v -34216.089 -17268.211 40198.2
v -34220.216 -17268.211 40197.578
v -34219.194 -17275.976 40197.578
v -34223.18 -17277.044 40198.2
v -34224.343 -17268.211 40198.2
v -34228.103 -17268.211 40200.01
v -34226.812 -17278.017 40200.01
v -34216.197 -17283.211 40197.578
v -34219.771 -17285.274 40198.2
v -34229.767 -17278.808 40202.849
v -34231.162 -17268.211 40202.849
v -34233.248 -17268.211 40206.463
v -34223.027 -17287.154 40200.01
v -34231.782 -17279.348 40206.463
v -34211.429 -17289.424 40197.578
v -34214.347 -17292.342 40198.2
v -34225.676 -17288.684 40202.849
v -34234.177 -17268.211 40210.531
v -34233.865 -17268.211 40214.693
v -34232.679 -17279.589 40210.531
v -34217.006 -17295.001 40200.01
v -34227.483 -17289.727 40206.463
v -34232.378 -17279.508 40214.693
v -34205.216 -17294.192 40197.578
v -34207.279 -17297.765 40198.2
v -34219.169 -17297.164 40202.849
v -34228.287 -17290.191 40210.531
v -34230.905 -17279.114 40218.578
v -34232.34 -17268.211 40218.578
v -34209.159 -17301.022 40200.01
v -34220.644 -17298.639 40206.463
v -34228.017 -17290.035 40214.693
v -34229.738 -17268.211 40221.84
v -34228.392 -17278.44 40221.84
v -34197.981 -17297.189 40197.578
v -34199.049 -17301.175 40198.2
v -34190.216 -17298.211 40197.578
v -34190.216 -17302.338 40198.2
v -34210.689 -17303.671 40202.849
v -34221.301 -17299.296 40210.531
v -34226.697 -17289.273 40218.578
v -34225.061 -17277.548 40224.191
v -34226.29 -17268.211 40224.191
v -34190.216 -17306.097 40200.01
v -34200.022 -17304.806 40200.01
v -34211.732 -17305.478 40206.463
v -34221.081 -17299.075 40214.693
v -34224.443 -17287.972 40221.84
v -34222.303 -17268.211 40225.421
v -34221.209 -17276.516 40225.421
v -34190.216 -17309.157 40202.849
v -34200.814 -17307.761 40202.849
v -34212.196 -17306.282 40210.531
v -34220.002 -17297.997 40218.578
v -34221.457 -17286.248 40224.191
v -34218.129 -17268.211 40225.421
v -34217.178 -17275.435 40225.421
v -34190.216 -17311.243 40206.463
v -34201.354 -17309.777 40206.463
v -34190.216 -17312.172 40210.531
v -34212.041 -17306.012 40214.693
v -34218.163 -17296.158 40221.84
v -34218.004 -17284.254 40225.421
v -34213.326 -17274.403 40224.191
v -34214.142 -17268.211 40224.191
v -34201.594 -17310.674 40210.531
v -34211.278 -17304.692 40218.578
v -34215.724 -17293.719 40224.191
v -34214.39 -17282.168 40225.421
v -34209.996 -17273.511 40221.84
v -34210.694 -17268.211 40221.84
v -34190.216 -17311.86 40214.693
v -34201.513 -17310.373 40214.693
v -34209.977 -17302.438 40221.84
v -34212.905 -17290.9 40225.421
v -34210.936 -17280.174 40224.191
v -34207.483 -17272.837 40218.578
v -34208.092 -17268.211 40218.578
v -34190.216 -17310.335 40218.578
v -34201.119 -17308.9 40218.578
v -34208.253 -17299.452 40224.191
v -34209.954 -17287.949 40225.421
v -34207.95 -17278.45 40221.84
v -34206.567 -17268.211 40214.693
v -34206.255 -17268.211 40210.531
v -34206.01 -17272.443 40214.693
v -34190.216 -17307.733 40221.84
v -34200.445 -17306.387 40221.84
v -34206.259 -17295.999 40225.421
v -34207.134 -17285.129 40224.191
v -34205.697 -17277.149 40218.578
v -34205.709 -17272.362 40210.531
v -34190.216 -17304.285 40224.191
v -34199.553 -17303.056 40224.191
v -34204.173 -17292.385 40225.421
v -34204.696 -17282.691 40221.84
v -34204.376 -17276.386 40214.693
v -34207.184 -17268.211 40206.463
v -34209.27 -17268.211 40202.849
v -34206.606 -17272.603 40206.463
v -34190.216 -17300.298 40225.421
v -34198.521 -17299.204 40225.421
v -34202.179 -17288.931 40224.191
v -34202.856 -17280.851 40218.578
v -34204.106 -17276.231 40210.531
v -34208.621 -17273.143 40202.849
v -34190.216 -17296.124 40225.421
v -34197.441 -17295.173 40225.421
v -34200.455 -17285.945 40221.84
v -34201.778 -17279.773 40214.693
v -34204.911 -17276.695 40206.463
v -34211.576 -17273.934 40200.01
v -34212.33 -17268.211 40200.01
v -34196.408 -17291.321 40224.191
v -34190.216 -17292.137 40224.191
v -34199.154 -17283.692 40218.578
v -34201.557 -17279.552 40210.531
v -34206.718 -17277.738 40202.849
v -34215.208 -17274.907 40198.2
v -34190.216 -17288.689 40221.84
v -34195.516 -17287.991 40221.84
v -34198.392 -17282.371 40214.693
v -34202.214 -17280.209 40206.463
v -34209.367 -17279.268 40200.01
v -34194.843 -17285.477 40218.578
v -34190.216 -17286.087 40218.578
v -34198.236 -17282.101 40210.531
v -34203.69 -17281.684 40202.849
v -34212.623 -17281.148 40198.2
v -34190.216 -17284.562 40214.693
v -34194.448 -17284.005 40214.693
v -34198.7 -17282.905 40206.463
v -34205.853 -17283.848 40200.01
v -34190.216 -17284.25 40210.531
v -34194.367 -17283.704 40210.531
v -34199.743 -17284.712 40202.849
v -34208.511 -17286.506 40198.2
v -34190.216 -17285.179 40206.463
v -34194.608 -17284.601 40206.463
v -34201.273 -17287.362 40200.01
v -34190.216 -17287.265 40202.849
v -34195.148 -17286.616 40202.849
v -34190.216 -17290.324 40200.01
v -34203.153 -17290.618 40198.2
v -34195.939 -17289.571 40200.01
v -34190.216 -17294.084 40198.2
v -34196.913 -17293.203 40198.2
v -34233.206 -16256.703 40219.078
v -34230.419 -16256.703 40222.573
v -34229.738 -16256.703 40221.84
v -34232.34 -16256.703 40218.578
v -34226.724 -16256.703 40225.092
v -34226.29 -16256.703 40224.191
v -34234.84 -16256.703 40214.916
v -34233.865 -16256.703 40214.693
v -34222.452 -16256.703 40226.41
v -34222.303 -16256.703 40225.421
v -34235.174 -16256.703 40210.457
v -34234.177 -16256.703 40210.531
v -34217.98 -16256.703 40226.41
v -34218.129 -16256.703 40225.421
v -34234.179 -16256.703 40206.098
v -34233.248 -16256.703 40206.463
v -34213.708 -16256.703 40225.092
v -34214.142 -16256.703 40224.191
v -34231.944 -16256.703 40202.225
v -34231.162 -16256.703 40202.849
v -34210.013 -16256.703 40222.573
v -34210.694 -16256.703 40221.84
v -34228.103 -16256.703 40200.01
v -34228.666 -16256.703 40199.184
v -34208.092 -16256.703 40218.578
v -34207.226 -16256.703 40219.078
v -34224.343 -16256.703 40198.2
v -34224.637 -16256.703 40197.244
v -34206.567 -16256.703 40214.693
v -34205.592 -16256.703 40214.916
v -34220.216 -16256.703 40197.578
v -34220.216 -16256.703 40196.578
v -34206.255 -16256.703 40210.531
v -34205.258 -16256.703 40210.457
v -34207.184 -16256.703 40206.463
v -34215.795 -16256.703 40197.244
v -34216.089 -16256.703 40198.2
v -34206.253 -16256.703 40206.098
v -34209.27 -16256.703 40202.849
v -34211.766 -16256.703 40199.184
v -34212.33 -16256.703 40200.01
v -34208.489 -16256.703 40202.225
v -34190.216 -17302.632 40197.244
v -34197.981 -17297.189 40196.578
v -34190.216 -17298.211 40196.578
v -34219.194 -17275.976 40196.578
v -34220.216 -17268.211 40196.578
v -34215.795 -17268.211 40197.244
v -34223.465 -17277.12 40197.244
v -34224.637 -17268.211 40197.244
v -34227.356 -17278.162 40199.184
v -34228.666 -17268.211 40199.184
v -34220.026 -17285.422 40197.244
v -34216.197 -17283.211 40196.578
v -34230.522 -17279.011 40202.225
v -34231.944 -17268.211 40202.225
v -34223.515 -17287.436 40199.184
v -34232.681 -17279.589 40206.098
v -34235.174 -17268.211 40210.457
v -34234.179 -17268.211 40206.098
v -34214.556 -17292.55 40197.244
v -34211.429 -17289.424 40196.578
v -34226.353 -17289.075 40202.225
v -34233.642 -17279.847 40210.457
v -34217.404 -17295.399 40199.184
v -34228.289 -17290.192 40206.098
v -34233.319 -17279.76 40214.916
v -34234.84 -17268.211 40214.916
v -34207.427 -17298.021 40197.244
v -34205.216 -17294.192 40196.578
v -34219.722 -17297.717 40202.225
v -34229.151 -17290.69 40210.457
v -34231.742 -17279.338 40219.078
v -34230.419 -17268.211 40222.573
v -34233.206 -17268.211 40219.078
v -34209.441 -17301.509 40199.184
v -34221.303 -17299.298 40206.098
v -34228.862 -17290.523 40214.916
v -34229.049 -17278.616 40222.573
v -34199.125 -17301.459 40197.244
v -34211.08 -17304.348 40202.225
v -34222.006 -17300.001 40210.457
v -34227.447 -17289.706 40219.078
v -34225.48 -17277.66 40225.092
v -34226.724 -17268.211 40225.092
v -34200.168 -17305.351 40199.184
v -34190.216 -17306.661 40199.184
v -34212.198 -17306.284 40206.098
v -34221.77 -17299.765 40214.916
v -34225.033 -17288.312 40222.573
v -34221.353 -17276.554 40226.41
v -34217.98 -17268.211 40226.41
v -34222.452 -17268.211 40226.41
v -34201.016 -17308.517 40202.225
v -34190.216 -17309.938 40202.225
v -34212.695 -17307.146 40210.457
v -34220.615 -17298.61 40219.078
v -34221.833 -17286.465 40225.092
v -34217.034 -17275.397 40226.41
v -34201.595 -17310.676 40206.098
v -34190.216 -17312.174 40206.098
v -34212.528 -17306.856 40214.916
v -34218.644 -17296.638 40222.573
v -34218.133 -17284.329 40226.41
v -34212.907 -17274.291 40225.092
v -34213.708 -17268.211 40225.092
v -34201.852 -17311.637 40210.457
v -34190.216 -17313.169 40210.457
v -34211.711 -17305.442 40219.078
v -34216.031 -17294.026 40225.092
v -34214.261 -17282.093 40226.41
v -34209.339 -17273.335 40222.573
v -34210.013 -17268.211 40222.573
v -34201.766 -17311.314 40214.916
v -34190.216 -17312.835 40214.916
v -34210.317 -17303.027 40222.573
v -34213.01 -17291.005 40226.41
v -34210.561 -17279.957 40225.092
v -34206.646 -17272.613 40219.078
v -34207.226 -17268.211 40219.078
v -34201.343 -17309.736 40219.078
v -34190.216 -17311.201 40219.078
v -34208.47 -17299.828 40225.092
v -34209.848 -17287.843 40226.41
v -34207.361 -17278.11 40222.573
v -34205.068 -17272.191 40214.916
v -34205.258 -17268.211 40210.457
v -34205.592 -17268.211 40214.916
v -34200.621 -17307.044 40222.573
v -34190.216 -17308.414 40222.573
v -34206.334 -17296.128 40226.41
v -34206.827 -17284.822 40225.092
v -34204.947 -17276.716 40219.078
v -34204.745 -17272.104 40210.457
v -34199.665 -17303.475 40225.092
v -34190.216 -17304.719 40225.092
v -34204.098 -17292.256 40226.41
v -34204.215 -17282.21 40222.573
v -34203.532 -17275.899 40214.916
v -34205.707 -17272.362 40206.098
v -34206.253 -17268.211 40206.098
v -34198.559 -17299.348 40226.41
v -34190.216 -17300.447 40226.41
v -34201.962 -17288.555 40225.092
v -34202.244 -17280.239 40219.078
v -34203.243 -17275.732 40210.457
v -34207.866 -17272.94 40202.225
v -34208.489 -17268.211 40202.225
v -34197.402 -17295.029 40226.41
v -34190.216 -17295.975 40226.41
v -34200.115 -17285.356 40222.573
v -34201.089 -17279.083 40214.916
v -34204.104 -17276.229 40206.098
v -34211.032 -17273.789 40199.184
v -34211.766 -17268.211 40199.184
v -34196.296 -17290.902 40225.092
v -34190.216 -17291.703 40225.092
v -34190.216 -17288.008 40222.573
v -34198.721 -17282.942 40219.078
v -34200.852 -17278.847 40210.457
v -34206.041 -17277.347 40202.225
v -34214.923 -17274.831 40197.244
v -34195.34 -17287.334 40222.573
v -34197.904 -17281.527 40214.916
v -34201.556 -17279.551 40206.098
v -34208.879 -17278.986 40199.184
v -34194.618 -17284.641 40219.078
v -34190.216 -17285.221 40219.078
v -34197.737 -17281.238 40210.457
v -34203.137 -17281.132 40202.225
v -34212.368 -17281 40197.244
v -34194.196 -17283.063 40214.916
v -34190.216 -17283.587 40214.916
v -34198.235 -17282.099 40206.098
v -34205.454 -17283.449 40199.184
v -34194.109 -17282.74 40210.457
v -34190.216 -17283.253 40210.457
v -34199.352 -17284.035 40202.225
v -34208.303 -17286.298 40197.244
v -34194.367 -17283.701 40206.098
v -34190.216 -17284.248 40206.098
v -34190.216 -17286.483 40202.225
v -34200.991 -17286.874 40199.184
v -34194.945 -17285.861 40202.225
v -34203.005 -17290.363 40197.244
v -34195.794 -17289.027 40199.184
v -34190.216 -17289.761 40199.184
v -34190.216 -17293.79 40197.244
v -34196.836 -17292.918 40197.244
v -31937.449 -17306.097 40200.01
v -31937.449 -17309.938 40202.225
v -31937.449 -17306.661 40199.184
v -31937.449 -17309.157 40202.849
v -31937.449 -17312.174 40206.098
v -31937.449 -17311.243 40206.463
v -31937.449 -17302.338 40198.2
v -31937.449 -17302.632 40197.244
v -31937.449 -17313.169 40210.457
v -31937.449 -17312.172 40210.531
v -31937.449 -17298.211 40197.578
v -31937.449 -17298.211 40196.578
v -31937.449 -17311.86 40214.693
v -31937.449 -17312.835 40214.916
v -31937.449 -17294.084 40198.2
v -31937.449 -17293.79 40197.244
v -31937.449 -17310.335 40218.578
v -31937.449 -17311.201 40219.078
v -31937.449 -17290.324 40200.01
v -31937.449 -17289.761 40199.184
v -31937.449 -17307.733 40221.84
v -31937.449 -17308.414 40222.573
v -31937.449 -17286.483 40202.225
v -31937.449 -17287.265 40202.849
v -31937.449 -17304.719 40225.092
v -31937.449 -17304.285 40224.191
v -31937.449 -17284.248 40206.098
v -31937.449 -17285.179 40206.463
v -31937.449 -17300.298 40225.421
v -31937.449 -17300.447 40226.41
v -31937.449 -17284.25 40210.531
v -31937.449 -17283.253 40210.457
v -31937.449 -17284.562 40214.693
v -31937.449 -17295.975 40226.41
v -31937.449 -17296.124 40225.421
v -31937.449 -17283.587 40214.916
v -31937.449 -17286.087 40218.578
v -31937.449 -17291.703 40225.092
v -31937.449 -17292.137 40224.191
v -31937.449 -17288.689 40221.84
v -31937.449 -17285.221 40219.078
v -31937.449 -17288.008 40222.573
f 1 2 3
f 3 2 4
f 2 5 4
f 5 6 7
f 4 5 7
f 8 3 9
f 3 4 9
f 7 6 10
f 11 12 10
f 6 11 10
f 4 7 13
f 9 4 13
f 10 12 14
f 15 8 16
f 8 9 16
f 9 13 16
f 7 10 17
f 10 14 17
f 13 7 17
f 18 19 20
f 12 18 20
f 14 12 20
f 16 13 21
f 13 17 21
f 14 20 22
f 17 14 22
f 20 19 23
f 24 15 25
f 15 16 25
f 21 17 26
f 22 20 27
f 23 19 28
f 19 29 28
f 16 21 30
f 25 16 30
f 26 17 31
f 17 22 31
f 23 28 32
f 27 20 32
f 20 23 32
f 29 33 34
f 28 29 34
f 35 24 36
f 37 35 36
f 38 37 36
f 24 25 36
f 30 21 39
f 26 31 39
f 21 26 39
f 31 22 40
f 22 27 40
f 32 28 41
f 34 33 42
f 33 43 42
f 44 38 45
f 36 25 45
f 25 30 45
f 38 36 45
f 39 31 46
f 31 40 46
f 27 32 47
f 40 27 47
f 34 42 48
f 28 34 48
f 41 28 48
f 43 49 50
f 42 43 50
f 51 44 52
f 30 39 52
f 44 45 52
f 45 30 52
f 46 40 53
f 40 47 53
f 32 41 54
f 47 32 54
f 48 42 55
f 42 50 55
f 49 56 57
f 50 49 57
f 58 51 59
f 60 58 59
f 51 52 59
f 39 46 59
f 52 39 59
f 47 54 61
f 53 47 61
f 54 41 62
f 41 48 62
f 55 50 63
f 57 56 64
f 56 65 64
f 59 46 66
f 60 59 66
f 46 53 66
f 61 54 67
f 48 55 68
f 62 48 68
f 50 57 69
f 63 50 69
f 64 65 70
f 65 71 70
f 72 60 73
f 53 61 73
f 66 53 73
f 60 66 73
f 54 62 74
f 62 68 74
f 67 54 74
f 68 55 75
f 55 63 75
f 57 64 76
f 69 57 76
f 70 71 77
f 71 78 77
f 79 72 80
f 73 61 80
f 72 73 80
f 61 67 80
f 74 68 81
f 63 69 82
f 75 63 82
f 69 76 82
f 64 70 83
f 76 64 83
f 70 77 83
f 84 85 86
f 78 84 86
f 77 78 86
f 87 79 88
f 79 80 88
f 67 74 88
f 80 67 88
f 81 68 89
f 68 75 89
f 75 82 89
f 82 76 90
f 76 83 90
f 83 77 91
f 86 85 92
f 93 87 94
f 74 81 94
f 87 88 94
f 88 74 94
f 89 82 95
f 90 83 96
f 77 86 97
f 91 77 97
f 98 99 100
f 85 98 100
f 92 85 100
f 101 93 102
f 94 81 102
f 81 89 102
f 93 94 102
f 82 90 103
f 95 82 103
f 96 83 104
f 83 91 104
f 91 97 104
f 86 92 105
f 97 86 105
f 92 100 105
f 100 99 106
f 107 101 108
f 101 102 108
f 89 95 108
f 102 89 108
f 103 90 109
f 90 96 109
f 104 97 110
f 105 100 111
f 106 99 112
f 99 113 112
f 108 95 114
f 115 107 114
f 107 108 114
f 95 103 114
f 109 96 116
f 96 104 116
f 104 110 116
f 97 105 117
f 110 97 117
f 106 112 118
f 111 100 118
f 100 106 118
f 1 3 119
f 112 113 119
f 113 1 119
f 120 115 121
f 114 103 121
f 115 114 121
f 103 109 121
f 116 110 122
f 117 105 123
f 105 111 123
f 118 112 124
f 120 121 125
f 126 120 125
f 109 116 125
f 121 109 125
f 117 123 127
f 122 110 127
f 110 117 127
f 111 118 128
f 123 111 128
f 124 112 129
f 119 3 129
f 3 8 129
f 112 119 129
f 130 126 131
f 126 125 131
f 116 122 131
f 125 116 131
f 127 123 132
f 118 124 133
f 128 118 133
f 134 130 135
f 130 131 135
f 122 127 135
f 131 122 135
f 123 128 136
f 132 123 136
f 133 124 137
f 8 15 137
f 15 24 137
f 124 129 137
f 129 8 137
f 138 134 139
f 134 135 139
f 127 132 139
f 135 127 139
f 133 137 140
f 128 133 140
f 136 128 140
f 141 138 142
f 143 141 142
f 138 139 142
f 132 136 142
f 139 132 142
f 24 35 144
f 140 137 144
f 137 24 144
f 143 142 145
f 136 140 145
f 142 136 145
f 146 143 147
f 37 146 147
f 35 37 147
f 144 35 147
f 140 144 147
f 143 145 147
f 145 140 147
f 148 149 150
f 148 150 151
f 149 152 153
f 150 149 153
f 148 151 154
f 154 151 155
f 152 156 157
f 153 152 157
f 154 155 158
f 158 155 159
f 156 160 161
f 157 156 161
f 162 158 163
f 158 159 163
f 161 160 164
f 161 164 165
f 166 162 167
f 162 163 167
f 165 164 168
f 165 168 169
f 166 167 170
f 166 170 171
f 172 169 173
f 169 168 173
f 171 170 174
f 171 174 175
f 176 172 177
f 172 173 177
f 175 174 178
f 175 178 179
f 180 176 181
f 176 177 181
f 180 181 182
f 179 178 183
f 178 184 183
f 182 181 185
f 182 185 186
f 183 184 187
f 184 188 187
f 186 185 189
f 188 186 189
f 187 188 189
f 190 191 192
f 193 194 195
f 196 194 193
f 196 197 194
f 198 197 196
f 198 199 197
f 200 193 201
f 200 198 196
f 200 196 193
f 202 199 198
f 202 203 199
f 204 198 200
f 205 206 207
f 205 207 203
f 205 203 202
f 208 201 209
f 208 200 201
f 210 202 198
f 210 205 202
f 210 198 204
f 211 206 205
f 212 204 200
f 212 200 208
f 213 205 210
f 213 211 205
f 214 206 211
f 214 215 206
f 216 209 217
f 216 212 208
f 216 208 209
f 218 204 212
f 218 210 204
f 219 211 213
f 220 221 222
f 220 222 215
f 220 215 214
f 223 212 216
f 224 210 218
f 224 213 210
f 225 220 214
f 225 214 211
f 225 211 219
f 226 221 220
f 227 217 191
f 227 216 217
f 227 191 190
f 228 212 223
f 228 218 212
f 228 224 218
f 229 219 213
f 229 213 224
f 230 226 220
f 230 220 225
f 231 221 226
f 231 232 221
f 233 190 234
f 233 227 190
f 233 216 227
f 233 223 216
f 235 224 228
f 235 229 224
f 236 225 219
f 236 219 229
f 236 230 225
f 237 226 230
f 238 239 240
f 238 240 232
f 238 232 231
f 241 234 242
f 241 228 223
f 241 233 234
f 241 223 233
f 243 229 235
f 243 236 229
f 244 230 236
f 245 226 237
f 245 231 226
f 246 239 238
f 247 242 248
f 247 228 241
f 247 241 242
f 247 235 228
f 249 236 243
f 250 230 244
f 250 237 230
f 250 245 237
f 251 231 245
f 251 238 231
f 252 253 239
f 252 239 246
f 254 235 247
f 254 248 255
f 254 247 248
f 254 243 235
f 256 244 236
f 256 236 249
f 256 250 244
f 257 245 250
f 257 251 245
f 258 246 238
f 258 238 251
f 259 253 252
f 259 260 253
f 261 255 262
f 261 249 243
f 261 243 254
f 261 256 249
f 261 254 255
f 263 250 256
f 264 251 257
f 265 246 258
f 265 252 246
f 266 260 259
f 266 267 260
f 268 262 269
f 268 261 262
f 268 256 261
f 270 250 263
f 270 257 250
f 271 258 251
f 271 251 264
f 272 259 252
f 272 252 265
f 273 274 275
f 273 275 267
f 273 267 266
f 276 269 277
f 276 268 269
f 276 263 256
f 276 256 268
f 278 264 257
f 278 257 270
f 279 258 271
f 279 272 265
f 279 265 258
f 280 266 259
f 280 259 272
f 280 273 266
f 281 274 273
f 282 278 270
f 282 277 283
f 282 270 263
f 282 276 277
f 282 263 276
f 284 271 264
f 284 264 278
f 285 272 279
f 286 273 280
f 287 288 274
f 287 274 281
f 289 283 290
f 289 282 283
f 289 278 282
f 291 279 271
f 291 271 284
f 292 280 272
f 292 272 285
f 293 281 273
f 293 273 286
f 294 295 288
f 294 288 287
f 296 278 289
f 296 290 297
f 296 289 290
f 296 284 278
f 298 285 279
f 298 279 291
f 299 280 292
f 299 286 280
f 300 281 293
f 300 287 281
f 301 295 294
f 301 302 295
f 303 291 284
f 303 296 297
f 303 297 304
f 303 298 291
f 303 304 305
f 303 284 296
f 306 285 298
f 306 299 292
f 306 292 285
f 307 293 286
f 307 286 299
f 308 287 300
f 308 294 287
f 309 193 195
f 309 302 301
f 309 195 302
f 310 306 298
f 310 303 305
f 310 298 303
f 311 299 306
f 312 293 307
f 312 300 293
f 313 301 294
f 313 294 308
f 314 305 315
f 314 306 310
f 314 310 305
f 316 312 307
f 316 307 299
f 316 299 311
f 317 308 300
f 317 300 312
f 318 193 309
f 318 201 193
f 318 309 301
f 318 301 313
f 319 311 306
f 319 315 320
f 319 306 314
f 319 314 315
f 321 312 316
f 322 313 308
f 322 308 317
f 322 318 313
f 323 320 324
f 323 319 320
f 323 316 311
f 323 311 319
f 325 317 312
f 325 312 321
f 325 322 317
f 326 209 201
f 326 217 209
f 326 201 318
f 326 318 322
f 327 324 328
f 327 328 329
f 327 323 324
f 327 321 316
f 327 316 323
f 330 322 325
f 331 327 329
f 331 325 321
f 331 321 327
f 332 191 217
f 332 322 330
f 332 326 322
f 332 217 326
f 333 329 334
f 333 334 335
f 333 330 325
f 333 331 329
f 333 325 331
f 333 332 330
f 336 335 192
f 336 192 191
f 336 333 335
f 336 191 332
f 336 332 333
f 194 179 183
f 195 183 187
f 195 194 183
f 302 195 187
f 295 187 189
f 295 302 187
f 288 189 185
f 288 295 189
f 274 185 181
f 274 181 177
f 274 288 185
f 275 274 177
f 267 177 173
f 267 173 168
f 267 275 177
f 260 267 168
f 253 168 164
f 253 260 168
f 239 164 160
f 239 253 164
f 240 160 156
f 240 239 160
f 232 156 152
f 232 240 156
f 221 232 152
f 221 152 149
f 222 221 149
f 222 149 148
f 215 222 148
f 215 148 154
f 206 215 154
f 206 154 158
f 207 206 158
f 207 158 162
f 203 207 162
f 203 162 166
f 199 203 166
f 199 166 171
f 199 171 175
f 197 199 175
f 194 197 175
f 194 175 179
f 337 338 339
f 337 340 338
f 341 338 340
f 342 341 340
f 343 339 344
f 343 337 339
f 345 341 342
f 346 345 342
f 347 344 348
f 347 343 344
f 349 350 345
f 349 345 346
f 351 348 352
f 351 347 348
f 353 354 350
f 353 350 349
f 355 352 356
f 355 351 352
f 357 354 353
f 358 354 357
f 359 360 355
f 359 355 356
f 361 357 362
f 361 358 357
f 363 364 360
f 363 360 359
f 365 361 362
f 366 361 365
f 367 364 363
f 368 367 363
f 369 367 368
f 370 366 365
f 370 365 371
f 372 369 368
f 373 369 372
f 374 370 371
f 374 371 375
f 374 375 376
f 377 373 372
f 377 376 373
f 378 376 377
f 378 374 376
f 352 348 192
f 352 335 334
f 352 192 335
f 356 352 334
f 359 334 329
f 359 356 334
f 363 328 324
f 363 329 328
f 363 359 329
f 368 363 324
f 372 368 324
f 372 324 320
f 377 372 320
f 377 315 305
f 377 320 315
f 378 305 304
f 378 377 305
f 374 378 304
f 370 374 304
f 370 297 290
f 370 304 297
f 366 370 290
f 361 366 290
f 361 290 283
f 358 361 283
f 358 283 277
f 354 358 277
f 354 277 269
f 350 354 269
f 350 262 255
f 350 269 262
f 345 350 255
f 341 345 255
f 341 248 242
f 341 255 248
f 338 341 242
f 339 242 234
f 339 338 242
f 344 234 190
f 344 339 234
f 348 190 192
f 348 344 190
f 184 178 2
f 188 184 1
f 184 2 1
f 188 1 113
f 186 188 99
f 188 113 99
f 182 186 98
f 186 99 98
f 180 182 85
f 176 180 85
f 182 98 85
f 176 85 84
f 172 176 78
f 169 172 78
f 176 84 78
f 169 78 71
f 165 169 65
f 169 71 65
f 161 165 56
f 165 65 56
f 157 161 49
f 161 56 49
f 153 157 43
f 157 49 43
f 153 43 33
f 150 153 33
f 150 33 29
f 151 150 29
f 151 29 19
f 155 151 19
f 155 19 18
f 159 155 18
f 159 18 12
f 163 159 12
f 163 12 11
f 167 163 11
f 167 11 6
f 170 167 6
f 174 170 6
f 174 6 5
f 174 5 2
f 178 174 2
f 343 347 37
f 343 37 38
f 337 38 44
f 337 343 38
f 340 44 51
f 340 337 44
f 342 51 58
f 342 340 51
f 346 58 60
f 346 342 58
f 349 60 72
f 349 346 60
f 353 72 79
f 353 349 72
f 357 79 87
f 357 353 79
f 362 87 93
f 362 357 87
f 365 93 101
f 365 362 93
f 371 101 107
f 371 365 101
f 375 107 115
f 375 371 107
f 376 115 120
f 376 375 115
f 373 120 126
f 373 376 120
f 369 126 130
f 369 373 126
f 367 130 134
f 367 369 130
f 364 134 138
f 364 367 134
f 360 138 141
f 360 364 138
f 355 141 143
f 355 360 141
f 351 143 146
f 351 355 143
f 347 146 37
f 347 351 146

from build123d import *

# Parameters (mm, degrees)
SWEEP_THIN1_PROFILE_R   = 15
SWEEP_THIN1_PROFILE_R_2 = 14


with BuildPart() as part:
    # Sweep-Thin1: sweep along a curve in space
    with BuildLine() as sweep_thin1_path:
        Line((-34220.216064675, -16256.702563295, 40211.577712625), (-34220.216064675, -17268.210932222, 40211.577712625))
        ThreePointArc((-34190.216064675, -17298.210932222, 40211.577712625), (-34211.429268111, -17289.424135658, 40211.577712625), (-34220.216064675, -17268.210932222, 40211.577712625))
        Line((-34190.216064675, -17298.210932222, 40211.577712625), (-31937.449283249, -17298.210932222, 40211.577712625))
    # Sweep-Thin1 profile (on start of the path) → Sweep-Thin1 (sweep)
    with BuildSketch(Plane(origin=(-34220.216064675, -16256.702563295, 40211.577712625), x_dir=(0, 0, -1), z_dir=(0, -1, 0))):
        Circle(SWEEP_THIN1_PROFILE_R)
        Circle(SWEEP_THIN1_PROFILE_R_2, mode=Mode.SUBTRACT)
    sweep(path=sweep_thin1_path.line)


solid = part.part
